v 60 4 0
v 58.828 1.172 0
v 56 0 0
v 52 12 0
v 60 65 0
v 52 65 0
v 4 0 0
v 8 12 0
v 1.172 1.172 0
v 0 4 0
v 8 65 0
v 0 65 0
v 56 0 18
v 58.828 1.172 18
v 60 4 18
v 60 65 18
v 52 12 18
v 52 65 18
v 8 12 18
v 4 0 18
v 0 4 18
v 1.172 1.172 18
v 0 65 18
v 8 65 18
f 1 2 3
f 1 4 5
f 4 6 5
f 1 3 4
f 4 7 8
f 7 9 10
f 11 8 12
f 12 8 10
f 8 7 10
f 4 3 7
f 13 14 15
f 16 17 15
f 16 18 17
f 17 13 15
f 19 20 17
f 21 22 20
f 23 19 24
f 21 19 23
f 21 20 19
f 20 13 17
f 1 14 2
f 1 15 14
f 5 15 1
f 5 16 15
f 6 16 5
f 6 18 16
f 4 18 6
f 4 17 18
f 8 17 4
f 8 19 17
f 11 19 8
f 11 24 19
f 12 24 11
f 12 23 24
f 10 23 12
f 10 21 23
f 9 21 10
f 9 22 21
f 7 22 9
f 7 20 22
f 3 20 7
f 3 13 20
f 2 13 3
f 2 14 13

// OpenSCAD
$fn = 32;

// ----------------------------------------------------------------------
// Heat sink frame: 60 x 65 mm frame, 8 mm walls
// ----------------------------------------------------------------------

// --- parameters (mm) ---
profile_height = 18;      // extrusion height
profile_points = 12;      // points of the closed outline

profile = [[0, 4], [1.172, 1.172], [4, 0], [56, 0], [58.828, 1.172], [60, 4], [60, 65], [52, 65], [52, 12], [8, 12], [8, 65], [0, 65]];  // single closed polygon, 12 points, counter clockwise

// --- the one profile operation ---
linear_extrude(height = profile_height) polygon(points = profile);
